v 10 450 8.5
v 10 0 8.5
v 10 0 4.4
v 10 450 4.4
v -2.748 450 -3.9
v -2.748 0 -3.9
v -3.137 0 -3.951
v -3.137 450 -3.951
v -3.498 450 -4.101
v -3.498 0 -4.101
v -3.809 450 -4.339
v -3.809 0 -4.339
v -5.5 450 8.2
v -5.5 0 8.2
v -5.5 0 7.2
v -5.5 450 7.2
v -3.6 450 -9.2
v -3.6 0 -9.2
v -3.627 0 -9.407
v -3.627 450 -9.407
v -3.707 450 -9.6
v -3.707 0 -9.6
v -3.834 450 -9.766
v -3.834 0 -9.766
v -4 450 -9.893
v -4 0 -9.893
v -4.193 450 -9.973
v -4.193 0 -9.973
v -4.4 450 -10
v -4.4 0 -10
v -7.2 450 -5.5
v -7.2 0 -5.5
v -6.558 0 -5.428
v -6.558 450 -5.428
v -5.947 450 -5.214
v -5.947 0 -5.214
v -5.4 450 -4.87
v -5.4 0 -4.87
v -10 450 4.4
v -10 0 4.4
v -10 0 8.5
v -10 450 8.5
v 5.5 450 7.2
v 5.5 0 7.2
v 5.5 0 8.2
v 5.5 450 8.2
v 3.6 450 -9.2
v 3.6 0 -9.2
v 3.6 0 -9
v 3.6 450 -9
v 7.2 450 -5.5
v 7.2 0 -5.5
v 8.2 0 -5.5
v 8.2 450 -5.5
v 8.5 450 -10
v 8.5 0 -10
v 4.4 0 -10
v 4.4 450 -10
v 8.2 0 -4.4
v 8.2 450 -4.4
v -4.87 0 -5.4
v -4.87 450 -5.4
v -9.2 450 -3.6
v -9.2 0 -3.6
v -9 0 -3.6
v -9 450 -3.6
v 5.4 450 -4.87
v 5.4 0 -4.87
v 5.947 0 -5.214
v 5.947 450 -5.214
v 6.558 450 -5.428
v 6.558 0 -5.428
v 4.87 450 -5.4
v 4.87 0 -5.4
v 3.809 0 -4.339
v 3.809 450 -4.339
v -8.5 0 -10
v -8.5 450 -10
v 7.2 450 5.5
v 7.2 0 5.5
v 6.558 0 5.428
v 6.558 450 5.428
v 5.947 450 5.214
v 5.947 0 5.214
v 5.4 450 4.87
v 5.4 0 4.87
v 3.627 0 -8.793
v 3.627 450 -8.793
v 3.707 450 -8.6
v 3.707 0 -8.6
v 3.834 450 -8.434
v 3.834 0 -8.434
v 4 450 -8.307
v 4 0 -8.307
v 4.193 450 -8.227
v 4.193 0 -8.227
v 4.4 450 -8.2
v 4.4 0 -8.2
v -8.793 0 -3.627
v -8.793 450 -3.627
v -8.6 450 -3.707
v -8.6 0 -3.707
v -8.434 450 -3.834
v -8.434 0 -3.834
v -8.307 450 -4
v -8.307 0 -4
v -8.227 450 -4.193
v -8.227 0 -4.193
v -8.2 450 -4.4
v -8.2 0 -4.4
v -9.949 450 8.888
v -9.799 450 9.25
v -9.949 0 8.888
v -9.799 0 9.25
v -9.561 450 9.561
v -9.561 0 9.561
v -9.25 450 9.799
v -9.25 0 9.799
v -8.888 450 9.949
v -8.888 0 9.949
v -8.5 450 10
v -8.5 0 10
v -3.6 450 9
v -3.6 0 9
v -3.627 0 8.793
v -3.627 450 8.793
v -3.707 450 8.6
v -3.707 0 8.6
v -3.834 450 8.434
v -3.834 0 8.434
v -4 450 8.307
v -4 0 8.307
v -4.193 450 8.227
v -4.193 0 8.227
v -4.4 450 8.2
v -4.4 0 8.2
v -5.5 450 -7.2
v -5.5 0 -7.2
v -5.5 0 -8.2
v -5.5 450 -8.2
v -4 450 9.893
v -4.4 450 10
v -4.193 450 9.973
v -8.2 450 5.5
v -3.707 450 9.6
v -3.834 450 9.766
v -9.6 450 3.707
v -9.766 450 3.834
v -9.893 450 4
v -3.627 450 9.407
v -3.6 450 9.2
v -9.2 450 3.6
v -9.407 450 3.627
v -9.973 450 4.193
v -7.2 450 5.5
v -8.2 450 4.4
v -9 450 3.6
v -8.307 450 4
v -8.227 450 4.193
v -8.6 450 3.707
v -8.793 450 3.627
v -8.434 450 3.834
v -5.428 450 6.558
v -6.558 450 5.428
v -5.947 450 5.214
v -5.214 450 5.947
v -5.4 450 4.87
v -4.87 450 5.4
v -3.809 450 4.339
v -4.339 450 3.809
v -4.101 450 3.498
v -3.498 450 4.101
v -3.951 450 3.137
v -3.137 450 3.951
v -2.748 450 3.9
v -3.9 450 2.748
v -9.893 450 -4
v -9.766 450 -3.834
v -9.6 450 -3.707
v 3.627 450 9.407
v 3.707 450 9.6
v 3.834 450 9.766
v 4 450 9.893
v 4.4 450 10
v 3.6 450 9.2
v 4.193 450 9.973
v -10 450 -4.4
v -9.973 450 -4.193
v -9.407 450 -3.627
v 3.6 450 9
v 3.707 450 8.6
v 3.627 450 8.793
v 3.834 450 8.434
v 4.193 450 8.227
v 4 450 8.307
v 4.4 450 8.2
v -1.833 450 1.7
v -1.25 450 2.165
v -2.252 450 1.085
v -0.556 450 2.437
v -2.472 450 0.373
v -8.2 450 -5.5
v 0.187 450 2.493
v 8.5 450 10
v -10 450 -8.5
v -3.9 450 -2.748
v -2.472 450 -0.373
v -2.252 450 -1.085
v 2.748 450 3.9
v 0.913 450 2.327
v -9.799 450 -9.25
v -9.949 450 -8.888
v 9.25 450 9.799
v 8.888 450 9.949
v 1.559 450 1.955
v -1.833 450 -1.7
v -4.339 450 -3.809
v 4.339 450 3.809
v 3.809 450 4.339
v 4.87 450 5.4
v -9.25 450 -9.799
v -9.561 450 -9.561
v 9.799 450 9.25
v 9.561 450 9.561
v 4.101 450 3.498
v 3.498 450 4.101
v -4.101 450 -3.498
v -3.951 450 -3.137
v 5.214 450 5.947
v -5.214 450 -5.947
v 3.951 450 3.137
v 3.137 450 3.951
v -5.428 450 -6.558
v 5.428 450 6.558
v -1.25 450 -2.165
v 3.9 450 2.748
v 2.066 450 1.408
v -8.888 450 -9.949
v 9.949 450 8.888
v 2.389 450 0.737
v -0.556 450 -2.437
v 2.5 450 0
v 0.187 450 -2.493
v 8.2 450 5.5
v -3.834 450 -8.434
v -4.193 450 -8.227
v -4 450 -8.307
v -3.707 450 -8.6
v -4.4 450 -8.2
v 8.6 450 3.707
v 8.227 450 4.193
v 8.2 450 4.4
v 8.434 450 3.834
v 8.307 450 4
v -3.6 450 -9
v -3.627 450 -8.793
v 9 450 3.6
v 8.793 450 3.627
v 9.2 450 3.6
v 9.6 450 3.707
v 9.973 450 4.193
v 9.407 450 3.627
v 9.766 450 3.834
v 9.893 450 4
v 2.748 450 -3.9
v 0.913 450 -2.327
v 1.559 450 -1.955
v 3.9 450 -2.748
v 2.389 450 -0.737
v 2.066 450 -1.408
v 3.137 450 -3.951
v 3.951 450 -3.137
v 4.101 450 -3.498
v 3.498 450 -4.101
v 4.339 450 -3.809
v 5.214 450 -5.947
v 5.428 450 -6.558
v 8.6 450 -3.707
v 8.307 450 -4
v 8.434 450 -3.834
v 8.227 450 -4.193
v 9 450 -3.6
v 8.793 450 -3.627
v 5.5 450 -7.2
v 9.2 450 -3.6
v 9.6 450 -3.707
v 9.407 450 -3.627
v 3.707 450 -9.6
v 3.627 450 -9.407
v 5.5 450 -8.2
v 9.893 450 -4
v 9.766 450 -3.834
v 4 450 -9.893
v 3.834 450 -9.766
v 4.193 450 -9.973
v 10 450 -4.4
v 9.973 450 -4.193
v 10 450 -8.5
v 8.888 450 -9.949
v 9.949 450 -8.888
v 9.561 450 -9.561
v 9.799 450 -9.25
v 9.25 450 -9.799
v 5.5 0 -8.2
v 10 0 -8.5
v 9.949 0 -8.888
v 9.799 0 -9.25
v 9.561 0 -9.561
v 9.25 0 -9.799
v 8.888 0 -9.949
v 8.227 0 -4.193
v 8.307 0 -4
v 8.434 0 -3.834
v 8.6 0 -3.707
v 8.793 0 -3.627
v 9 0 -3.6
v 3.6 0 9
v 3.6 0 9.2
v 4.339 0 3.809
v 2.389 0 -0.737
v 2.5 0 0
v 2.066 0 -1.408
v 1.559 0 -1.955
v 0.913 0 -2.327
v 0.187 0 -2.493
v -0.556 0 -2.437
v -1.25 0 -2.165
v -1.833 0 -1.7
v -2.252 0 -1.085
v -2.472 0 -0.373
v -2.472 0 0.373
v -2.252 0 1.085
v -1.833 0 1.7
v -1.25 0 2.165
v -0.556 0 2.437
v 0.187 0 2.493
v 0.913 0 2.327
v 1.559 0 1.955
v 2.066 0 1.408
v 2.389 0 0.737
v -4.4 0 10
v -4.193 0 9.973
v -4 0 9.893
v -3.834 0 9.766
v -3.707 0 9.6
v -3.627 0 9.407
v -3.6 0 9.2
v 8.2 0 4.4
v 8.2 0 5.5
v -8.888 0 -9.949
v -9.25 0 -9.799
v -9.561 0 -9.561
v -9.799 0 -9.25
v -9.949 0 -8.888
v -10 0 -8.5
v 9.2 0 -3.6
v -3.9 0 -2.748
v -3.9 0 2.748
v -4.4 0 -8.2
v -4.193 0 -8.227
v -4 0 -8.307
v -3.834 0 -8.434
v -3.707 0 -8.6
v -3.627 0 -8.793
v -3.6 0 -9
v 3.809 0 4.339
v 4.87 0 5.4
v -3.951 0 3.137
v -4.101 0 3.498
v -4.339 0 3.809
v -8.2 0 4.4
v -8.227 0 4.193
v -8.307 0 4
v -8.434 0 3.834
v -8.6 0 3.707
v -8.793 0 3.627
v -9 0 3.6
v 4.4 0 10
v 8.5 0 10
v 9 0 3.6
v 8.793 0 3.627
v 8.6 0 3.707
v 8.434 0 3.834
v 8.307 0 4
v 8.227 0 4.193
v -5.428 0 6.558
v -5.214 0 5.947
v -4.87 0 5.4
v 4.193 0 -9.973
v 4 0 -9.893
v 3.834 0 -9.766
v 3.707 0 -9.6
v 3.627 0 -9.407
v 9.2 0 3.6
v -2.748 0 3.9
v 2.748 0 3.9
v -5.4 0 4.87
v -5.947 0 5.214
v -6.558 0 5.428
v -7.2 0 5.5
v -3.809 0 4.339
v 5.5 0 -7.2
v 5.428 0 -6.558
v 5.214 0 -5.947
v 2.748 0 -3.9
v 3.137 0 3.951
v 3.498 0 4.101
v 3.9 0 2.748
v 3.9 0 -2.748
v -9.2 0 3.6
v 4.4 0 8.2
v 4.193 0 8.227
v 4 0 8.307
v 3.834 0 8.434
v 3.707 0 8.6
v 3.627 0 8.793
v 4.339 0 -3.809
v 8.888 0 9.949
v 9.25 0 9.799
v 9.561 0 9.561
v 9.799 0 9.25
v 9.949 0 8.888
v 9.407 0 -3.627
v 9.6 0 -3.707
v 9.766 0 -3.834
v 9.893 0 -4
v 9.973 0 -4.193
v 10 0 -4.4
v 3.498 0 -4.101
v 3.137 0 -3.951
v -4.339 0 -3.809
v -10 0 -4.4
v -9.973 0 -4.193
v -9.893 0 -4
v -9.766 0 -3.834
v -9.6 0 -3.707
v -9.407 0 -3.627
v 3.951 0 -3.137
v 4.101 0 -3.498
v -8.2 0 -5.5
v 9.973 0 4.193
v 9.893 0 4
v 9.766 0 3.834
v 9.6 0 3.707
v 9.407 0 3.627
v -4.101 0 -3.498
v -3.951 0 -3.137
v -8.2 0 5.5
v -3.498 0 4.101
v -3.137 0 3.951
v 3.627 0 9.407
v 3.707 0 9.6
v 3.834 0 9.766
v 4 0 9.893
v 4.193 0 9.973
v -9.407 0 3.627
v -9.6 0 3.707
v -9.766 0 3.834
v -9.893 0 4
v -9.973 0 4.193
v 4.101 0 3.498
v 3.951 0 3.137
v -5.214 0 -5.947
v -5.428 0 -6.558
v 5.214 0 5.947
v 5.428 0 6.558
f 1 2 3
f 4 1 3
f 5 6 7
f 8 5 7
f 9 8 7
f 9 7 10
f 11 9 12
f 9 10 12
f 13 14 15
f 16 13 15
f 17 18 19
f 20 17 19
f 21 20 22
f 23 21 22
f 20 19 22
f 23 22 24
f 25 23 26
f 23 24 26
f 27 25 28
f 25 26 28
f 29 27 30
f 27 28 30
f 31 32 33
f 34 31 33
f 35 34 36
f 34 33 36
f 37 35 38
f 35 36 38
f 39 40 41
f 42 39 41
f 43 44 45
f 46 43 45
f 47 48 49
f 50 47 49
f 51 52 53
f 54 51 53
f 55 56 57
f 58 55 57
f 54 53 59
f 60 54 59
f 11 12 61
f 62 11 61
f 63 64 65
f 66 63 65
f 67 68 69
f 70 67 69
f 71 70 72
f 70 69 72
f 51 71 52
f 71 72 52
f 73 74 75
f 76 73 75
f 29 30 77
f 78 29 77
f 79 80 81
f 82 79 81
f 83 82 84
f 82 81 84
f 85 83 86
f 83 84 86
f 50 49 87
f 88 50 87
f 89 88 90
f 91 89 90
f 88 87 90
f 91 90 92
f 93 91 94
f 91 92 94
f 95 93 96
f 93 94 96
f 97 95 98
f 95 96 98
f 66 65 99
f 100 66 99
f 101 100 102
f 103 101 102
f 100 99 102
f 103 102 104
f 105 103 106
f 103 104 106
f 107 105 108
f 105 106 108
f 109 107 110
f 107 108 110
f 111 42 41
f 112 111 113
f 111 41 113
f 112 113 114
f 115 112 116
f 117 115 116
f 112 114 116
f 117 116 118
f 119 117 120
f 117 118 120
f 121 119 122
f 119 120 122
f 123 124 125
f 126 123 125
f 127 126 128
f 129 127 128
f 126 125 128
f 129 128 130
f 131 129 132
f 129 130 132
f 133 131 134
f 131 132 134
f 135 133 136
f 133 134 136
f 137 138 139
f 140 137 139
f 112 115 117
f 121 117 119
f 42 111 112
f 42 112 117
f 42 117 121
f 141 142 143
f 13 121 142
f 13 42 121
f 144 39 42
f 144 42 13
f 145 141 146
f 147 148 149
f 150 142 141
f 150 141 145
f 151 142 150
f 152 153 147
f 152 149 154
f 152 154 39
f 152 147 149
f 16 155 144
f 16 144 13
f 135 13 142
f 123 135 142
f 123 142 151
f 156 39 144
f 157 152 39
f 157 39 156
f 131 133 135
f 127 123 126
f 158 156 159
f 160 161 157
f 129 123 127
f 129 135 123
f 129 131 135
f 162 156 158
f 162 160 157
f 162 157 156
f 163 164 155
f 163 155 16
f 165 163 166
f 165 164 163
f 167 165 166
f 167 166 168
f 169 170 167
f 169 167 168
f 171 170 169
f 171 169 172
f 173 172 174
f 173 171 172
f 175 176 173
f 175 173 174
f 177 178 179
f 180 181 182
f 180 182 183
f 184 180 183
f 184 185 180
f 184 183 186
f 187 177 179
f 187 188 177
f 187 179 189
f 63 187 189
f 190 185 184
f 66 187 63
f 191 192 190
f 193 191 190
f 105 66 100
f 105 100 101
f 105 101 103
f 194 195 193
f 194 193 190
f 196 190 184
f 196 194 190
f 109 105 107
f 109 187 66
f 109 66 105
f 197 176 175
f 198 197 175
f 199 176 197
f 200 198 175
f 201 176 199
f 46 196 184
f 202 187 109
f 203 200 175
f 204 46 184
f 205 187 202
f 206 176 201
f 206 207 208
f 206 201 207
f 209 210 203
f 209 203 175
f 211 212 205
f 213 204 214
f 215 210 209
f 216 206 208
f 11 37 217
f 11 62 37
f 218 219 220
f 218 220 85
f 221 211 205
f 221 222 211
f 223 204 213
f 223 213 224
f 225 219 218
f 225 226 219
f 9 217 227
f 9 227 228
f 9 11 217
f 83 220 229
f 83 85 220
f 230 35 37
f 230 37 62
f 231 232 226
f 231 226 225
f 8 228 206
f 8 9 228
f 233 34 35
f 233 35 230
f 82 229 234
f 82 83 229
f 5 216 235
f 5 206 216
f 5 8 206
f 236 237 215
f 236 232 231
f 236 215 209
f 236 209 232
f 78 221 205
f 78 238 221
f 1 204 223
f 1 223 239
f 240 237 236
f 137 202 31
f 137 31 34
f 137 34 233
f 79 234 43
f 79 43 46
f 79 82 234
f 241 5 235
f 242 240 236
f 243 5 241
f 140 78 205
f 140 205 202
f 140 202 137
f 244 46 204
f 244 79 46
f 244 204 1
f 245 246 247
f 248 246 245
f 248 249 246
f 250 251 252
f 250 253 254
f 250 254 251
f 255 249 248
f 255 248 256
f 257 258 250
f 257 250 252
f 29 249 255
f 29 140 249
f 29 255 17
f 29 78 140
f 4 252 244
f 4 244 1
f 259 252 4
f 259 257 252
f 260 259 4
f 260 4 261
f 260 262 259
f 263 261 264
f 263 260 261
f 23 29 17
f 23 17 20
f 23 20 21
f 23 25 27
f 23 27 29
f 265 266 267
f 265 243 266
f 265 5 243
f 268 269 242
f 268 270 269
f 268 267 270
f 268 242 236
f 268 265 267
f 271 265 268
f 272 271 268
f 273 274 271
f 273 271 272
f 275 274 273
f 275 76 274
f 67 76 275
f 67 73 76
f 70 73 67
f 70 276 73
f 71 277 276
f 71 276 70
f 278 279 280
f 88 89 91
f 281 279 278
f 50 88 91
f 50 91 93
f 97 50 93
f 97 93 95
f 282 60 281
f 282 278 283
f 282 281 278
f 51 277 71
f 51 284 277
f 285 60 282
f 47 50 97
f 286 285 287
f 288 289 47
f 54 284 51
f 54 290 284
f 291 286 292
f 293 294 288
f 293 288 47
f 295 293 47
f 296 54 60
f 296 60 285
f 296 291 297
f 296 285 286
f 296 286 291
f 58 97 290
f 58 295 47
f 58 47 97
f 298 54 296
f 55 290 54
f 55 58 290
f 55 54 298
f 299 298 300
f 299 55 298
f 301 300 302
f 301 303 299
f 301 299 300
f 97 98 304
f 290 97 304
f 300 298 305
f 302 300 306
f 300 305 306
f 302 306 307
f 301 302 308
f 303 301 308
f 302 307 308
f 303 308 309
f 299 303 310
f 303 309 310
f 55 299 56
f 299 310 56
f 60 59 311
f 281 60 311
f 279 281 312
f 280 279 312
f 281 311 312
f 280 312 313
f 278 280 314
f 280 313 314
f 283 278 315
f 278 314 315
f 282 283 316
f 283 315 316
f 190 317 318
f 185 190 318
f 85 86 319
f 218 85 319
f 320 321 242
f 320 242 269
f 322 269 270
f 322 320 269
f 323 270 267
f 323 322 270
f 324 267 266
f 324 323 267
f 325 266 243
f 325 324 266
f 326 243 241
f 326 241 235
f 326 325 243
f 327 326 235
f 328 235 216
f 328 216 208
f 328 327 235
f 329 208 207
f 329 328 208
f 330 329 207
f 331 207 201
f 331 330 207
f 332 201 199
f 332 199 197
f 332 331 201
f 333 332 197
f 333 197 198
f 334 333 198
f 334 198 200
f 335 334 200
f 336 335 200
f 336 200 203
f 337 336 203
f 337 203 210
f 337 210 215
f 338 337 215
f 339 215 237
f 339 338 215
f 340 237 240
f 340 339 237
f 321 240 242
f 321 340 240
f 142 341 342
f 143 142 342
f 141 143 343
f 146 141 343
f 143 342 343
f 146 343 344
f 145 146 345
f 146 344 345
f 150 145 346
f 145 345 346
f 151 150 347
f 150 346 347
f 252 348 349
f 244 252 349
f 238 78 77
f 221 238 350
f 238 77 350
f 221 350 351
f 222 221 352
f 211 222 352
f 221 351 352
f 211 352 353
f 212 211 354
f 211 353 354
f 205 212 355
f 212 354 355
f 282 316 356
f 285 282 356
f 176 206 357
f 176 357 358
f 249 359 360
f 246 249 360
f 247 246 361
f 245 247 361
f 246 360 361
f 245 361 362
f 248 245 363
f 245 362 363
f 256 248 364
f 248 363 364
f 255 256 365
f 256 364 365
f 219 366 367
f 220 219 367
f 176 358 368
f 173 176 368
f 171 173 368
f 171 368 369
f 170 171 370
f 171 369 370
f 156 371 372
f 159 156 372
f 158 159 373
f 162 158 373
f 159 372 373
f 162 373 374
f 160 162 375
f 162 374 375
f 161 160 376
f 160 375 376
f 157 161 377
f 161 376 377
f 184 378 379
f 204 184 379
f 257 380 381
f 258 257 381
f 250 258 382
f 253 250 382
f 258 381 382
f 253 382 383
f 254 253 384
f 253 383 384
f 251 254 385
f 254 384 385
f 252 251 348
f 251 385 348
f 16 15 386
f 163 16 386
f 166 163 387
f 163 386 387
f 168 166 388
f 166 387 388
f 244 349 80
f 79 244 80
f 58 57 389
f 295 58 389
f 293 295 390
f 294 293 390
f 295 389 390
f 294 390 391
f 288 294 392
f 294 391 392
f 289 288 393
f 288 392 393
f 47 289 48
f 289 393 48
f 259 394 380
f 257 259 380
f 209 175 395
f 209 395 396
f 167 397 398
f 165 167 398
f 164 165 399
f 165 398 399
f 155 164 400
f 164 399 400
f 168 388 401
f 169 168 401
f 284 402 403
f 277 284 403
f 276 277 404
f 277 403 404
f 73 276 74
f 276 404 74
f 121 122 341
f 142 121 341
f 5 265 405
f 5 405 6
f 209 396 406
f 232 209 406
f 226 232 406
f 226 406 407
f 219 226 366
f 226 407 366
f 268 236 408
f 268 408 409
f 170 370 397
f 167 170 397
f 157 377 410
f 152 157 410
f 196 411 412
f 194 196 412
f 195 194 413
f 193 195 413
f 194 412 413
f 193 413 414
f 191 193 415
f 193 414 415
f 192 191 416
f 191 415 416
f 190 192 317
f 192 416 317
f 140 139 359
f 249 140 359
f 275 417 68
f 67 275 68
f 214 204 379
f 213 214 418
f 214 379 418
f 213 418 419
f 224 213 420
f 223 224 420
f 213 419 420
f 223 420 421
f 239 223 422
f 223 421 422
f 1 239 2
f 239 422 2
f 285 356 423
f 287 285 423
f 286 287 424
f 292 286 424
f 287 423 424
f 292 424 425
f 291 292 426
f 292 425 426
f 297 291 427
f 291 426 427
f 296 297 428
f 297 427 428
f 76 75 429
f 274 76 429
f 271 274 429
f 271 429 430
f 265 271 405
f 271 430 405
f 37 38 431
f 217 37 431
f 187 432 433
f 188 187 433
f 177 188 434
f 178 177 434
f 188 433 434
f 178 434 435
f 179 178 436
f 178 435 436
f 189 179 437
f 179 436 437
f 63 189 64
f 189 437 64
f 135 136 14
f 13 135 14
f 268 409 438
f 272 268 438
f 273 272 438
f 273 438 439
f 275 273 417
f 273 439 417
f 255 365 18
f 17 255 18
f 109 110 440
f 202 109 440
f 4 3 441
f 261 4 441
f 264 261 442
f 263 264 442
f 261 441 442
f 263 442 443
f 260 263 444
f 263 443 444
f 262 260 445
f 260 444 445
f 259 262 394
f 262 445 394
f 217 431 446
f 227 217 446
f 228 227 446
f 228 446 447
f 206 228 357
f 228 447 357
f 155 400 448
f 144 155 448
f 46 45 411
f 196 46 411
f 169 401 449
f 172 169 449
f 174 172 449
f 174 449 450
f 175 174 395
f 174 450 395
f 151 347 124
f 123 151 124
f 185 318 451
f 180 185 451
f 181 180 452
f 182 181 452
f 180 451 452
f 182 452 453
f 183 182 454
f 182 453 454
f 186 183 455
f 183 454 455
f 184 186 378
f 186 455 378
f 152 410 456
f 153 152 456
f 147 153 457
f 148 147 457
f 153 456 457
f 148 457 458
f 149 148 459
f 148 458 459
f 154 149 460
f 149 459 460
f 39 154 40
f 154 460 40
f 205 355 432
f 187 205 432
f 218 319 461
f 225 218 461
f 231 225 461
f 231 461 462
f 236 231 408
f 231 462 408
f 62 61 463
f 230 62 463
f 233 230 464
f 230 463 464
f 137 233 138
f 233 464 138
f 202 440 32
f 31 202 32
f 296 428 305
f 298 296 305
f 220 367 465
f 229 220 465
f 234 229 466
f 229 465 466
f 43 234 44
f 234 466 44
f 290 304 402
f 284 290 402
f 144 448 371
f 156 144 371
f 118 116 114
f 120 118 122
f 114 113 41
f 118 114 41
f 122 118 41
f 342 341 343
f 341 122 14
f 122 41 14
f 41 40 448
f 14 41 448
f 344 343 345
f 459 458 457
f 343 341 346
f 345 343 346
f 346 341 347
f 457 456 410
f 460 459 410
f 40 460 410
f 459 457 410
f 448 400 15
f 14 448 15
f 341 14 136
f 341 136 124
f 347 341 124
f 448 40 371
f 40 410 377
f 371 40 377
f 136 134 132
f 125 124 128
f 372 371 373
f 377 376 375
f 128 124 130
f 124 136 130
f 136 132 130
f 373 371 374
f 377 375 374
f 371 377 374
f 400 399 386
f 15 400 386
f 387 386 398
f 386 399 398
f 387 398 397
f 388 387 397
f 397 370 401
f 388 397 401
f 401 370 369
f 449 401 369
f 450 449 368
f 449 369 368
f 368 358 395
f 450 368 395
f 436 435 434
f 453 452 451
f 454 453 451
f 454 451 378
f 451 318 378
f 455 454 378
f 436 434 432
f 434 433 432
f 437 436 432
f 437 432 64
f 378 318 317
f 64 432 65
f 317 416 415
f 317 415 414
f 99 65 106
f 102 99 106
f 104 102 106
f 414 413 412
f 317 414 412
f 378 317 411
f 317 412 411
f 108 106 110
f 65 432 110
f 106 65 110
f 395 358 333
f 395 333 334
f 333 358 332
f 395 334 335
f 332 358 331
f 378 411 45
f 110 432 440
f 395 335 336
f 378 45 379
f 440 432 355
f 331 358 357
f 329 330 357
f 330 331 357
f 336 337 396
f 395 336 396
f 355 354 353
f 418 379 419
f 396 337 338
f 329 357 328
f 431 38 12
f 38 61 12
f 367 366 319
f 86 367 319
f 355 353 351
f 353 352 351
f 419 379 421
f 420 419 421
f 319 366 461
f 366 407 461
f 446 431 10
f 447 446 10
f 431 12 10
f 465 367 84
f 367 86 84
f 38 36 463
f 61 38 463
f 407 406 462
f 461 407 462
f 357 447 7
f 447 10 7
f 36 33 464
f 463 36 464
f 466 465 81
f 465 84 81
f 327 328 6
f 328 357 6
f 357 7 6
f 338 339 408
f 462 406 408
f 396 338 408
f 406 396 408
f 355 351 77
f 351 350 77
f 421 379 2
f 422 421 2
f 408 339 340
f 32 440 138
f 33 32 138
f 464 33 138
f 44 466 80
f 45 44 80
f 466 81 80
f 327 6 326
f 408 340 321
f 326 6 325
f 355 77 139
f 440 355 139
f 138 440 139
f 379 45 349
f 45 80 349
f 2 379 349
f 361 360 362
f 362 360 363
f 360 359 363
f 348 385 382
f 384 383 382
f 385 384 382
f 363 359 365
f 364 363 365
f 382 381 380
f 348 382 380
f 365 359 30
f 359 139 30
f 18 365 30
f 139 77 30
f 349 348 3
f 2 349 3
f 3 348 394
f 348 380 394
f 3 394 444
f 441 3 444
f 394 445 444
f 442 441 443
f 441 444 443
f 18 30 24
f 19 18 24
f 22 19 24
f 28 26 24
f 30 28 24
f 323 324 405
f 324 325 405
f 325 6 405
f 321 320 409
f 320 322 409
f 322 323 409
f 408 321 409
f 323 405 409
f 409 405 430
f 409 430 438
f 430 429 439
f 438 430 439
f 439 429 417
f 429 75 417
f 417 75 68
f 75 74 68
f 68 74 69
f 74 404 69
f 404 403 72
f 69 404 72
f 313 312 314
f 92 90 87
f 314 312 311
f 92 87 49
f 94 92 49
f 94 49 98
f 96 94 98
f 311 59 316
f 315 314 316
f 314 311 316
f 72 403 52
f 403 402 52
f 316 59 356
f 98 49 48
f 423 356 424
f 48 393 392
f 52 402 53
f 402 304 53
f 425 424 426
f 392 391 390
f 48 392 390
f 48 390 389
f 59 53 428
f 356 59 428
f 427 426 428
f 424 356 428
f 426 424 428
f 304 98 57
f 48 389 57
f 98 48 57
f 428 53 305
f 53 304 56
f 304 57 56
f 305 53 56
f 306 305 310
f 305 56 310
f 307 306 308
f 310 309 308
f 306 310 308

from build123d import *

# Parameters (mm, degrees)
SKETCH2_R           = 2.5
BOSS_EXTRUDE1_DEPTH = 450


with BuildPart() as part:
    # Sketch2 → Boss-Extrude1 (new body)
    with BuildSketch(Plane(origin=(0, 0, 0), x_dir=(1, 0, 0), z_dir=(0, 1, 0))):
        with BuildLine():
            Line((-5.4, 4.869669914), (-4.339339828, 3.809009742))
            ThreePointArc((-4.339339828, 3.809009742), (-4.014180701, 3.322374719), (-3.9, 2.748349571))
            Line((-3.9, 2.748349571), (-3.9, -2.748349571))
            ThreePointArc((-3.9, -2.748349571), (-4.014180701, -3.322374719), (-4.339339828, -3.809009742))
            Line((-4.339339828, -3.809009742), (-5.4, -4.869669914))
            ThreePointArc((-5.4, -4.869669914), (-6.246412561, -5.337861749), (-7.2, -5.5))
            Line((-7.2, -5.5), (-8.2, -5.5))
            Line((-8.2, -5.5), (-8.2, -4.4))
            ThreePointArc((-8.2, -4.4), (-8.434314575, -3.834314575), (-9, -3.6))
            Line((-9, -3.6), (-9.2, -3.6))
            ThreePointArc((-9.2, -3.6), (-9.765685425, -3.834314575), (-10, -4.4))
            Line((-10, -4.4), (-10, -8.5))
            ThreePointArc((-10, -8.5), (-9.560660172, -9.560660172), (-8.5, -10))
            Line((-8.5, -10), (-4.4, -10))
            ThreePointArc((-4.4, -10), (-3.834314575, -9.765685425), (-3.6, -9.2))
            Line((-3.6, -9.2), (-3.6, -9))
            ThreePointArc((-3.6, -9), (-3.834314575, -8.434314575), (-4.4, -8.2))
            Line((-4.4, -8.2), (-5.5, -8.2))
            Line((-5.5, -8.2), (-5.5, -7.2))
            ThreePointArc((-5.5, -7.2), (-5.337861749, -6.246412561), (-4.869669914, -5.4))
            Line((-4.869669914, -5.4), (-3.809009742, -4.339339828))
            ThreePointArc((-3.809009742, -4.339339828), (-3.322374719, -4.014180701), (-2.748349571, -3.9))
            Line((-2.748349571, -3.9), (2.748349571, -3.9))
            ThreePointArc((2.748349571, -3.9), (3.322374719, -4.014180701), (3.809009742, -4.339339828))
            Line((3.809009742, -4.339339828), (4.869669914, -5.4))
            ThreePointArc((4.869669914, -5.4), (5.337861749, -6.246412561), (5.5, -7.2))
            Line((5.5, -7.2), (5.5, -8.2))
            Line((5.5, -8.2), (4.4, -8.2))
            ThreePointArc((4.4, -8.2), (3.834314575, -8.434314575), (3.6, -9))
            Line((3.6, -9), (3.6, -9.2))
            ThreePointArc((3.6, -9.2), (3.834314575, -9.765685425), (4.4, -10))
            Line((4.4, -10), (8.5, -10))
            ThreePointArc((8.5, -10), (9.560660172, -9.560660172), (10, -8.5))
            Line((10, -8.5), (10, -4.4))
            ThreePointArc((10, -4.4), (9.765685425, -3.834314575), (9.2, -3.6))
            Line((9.2, -3.6), (9, -3.6))
            ThreePointArc((9, -3.6), (8.434314575, -3.834314575), (8.2, -4.4))
            Line((8.2, -4.4), (8.2, -5.5))
            Line((8.2, -5.5), (7.2, -5.5))
            ThreePointArc((7.2, -5.5), (6.246412561, -5.337861749), (5.4, -4.869669914))
            Line((5.4, -4.869669914), (4.339339828, -3.809009742))
            ThreePointArc((4.339339828, -3.809009742), (4.014180701, -3.322374719), (3.9, -2.748349571))
            Line((3.9, -2.748349571), (3.9, 2.748349571))
            ThreePointArc((3.9, 2.748349571), (4.014180701, 3.322374719), (4.339339828, 3.809009742))
            Line((4.339339828, 3.809009742), (5.4, 4.869669914))
            ThreePointArc((5.4, 4.869669914), (6.246412561, 5.337861749), (7.2, 5.5))
            Line((7.2, 5.5), (8.2, 5.5))
            Line((8.2, 5.5), (8.2, 4.4))
            ThreePointArc((8.2, 4.4), (8.434314575, 3.834314575), (9, 3.6))
            Line((9, 3.6), (9.2, 3.6))
            ThreePointArc((9.2, 3.6), (9.765685425, 3.834314575), (10, 4.4))
            Line((10, 4.4), (10, 8.5))
            ThreePointArc((10, 8.5), (9.560660172, 9.560660172), (8.5, 10))
            Line((8.5, 10), (4.4, 10))
            ThreePointArc((4.4, 10), (3.834314575, 9.765685425), (3.6, 9.2))
            Line((3.6, 9.2), (3.6, 9))
            ThreePointArc((3.6, 9), (3.834314575, 8.434314575), (4.4, 8.2))
            Line((4.4, 8.2), (5.5, 8.2))
            Line((5.5, 8.2), (5.5, 7.2))
            ThreePointArc((5.5, 7.2), (5.337861749, 6.246412561), (4.869669914, 5.4))
            Line((4.869669914, 5.4), (3.809009742, 4.339339828))
            ThreePointArc((3.809009742, 4.339339828), (3.322374719, 4.014180701), (2.748349571, 3.9))
            Line((2.748349571, 3.9), (-2.748349571, 3.9))
            ThreePointArc((-2.748349571, 3.9), (-3.322374719, 4.014180701), (-3.809009742, 4.339339828))
            Line((-3.809009742, 4.339339828), (-4.869669914, 5.4))
            ThreePointArc((-4.869669914, 5.4), (-5.337861749, 6.246412561), (-5.5, 7.2))
            Line((-5.5, 7.2), (-5.5, 8.2))
            Line((-5.5, 8.2), (-4.4, 8.2))
            ThreePointArc((-4.4, 8.2), (-3.834314575, 8.434314575), (-3.6, 9))
            Line((-3.6, 9), (-3.6, 9.2))
            ThreePointArc((-3.6, 9.2), (-3.834314575, 9.765685425), (-4.4, 10))
            Line((-4.4, 10), (-8.5, 10))
            ThreePointArc((-8.5, 10), (-9.560660172, 9.560660172), (-10, 8.5))
            Line((-10, 8.5), (-10, 4.4))
            ThreePointArc((-10, 4.4), (-9.765685425, 3.834314575), (-9.2, 3.6))
            Line((-9.2, 3.6), (-9, 3.6))
            ThreePointArc((-9, 3.6), (-8.434314575, 3.834314575), (-8.2, 4.4))
            Line((-8.2, 4.4), (-8.2, 5.5))
            Line((-8.2, 5.5), (-7.2, 5.5))
            ThreePointArc((-7.2, 5.5), (-6.246412561, 5.337861749), (-5.4, 4.869669914))
        make_face()
        Circle(SKETCH2_R, mode=Mode.SUBTRACT)
    extrude(amount=BOSS_EXTRUDE1_DEPTH)


solid = part.part
